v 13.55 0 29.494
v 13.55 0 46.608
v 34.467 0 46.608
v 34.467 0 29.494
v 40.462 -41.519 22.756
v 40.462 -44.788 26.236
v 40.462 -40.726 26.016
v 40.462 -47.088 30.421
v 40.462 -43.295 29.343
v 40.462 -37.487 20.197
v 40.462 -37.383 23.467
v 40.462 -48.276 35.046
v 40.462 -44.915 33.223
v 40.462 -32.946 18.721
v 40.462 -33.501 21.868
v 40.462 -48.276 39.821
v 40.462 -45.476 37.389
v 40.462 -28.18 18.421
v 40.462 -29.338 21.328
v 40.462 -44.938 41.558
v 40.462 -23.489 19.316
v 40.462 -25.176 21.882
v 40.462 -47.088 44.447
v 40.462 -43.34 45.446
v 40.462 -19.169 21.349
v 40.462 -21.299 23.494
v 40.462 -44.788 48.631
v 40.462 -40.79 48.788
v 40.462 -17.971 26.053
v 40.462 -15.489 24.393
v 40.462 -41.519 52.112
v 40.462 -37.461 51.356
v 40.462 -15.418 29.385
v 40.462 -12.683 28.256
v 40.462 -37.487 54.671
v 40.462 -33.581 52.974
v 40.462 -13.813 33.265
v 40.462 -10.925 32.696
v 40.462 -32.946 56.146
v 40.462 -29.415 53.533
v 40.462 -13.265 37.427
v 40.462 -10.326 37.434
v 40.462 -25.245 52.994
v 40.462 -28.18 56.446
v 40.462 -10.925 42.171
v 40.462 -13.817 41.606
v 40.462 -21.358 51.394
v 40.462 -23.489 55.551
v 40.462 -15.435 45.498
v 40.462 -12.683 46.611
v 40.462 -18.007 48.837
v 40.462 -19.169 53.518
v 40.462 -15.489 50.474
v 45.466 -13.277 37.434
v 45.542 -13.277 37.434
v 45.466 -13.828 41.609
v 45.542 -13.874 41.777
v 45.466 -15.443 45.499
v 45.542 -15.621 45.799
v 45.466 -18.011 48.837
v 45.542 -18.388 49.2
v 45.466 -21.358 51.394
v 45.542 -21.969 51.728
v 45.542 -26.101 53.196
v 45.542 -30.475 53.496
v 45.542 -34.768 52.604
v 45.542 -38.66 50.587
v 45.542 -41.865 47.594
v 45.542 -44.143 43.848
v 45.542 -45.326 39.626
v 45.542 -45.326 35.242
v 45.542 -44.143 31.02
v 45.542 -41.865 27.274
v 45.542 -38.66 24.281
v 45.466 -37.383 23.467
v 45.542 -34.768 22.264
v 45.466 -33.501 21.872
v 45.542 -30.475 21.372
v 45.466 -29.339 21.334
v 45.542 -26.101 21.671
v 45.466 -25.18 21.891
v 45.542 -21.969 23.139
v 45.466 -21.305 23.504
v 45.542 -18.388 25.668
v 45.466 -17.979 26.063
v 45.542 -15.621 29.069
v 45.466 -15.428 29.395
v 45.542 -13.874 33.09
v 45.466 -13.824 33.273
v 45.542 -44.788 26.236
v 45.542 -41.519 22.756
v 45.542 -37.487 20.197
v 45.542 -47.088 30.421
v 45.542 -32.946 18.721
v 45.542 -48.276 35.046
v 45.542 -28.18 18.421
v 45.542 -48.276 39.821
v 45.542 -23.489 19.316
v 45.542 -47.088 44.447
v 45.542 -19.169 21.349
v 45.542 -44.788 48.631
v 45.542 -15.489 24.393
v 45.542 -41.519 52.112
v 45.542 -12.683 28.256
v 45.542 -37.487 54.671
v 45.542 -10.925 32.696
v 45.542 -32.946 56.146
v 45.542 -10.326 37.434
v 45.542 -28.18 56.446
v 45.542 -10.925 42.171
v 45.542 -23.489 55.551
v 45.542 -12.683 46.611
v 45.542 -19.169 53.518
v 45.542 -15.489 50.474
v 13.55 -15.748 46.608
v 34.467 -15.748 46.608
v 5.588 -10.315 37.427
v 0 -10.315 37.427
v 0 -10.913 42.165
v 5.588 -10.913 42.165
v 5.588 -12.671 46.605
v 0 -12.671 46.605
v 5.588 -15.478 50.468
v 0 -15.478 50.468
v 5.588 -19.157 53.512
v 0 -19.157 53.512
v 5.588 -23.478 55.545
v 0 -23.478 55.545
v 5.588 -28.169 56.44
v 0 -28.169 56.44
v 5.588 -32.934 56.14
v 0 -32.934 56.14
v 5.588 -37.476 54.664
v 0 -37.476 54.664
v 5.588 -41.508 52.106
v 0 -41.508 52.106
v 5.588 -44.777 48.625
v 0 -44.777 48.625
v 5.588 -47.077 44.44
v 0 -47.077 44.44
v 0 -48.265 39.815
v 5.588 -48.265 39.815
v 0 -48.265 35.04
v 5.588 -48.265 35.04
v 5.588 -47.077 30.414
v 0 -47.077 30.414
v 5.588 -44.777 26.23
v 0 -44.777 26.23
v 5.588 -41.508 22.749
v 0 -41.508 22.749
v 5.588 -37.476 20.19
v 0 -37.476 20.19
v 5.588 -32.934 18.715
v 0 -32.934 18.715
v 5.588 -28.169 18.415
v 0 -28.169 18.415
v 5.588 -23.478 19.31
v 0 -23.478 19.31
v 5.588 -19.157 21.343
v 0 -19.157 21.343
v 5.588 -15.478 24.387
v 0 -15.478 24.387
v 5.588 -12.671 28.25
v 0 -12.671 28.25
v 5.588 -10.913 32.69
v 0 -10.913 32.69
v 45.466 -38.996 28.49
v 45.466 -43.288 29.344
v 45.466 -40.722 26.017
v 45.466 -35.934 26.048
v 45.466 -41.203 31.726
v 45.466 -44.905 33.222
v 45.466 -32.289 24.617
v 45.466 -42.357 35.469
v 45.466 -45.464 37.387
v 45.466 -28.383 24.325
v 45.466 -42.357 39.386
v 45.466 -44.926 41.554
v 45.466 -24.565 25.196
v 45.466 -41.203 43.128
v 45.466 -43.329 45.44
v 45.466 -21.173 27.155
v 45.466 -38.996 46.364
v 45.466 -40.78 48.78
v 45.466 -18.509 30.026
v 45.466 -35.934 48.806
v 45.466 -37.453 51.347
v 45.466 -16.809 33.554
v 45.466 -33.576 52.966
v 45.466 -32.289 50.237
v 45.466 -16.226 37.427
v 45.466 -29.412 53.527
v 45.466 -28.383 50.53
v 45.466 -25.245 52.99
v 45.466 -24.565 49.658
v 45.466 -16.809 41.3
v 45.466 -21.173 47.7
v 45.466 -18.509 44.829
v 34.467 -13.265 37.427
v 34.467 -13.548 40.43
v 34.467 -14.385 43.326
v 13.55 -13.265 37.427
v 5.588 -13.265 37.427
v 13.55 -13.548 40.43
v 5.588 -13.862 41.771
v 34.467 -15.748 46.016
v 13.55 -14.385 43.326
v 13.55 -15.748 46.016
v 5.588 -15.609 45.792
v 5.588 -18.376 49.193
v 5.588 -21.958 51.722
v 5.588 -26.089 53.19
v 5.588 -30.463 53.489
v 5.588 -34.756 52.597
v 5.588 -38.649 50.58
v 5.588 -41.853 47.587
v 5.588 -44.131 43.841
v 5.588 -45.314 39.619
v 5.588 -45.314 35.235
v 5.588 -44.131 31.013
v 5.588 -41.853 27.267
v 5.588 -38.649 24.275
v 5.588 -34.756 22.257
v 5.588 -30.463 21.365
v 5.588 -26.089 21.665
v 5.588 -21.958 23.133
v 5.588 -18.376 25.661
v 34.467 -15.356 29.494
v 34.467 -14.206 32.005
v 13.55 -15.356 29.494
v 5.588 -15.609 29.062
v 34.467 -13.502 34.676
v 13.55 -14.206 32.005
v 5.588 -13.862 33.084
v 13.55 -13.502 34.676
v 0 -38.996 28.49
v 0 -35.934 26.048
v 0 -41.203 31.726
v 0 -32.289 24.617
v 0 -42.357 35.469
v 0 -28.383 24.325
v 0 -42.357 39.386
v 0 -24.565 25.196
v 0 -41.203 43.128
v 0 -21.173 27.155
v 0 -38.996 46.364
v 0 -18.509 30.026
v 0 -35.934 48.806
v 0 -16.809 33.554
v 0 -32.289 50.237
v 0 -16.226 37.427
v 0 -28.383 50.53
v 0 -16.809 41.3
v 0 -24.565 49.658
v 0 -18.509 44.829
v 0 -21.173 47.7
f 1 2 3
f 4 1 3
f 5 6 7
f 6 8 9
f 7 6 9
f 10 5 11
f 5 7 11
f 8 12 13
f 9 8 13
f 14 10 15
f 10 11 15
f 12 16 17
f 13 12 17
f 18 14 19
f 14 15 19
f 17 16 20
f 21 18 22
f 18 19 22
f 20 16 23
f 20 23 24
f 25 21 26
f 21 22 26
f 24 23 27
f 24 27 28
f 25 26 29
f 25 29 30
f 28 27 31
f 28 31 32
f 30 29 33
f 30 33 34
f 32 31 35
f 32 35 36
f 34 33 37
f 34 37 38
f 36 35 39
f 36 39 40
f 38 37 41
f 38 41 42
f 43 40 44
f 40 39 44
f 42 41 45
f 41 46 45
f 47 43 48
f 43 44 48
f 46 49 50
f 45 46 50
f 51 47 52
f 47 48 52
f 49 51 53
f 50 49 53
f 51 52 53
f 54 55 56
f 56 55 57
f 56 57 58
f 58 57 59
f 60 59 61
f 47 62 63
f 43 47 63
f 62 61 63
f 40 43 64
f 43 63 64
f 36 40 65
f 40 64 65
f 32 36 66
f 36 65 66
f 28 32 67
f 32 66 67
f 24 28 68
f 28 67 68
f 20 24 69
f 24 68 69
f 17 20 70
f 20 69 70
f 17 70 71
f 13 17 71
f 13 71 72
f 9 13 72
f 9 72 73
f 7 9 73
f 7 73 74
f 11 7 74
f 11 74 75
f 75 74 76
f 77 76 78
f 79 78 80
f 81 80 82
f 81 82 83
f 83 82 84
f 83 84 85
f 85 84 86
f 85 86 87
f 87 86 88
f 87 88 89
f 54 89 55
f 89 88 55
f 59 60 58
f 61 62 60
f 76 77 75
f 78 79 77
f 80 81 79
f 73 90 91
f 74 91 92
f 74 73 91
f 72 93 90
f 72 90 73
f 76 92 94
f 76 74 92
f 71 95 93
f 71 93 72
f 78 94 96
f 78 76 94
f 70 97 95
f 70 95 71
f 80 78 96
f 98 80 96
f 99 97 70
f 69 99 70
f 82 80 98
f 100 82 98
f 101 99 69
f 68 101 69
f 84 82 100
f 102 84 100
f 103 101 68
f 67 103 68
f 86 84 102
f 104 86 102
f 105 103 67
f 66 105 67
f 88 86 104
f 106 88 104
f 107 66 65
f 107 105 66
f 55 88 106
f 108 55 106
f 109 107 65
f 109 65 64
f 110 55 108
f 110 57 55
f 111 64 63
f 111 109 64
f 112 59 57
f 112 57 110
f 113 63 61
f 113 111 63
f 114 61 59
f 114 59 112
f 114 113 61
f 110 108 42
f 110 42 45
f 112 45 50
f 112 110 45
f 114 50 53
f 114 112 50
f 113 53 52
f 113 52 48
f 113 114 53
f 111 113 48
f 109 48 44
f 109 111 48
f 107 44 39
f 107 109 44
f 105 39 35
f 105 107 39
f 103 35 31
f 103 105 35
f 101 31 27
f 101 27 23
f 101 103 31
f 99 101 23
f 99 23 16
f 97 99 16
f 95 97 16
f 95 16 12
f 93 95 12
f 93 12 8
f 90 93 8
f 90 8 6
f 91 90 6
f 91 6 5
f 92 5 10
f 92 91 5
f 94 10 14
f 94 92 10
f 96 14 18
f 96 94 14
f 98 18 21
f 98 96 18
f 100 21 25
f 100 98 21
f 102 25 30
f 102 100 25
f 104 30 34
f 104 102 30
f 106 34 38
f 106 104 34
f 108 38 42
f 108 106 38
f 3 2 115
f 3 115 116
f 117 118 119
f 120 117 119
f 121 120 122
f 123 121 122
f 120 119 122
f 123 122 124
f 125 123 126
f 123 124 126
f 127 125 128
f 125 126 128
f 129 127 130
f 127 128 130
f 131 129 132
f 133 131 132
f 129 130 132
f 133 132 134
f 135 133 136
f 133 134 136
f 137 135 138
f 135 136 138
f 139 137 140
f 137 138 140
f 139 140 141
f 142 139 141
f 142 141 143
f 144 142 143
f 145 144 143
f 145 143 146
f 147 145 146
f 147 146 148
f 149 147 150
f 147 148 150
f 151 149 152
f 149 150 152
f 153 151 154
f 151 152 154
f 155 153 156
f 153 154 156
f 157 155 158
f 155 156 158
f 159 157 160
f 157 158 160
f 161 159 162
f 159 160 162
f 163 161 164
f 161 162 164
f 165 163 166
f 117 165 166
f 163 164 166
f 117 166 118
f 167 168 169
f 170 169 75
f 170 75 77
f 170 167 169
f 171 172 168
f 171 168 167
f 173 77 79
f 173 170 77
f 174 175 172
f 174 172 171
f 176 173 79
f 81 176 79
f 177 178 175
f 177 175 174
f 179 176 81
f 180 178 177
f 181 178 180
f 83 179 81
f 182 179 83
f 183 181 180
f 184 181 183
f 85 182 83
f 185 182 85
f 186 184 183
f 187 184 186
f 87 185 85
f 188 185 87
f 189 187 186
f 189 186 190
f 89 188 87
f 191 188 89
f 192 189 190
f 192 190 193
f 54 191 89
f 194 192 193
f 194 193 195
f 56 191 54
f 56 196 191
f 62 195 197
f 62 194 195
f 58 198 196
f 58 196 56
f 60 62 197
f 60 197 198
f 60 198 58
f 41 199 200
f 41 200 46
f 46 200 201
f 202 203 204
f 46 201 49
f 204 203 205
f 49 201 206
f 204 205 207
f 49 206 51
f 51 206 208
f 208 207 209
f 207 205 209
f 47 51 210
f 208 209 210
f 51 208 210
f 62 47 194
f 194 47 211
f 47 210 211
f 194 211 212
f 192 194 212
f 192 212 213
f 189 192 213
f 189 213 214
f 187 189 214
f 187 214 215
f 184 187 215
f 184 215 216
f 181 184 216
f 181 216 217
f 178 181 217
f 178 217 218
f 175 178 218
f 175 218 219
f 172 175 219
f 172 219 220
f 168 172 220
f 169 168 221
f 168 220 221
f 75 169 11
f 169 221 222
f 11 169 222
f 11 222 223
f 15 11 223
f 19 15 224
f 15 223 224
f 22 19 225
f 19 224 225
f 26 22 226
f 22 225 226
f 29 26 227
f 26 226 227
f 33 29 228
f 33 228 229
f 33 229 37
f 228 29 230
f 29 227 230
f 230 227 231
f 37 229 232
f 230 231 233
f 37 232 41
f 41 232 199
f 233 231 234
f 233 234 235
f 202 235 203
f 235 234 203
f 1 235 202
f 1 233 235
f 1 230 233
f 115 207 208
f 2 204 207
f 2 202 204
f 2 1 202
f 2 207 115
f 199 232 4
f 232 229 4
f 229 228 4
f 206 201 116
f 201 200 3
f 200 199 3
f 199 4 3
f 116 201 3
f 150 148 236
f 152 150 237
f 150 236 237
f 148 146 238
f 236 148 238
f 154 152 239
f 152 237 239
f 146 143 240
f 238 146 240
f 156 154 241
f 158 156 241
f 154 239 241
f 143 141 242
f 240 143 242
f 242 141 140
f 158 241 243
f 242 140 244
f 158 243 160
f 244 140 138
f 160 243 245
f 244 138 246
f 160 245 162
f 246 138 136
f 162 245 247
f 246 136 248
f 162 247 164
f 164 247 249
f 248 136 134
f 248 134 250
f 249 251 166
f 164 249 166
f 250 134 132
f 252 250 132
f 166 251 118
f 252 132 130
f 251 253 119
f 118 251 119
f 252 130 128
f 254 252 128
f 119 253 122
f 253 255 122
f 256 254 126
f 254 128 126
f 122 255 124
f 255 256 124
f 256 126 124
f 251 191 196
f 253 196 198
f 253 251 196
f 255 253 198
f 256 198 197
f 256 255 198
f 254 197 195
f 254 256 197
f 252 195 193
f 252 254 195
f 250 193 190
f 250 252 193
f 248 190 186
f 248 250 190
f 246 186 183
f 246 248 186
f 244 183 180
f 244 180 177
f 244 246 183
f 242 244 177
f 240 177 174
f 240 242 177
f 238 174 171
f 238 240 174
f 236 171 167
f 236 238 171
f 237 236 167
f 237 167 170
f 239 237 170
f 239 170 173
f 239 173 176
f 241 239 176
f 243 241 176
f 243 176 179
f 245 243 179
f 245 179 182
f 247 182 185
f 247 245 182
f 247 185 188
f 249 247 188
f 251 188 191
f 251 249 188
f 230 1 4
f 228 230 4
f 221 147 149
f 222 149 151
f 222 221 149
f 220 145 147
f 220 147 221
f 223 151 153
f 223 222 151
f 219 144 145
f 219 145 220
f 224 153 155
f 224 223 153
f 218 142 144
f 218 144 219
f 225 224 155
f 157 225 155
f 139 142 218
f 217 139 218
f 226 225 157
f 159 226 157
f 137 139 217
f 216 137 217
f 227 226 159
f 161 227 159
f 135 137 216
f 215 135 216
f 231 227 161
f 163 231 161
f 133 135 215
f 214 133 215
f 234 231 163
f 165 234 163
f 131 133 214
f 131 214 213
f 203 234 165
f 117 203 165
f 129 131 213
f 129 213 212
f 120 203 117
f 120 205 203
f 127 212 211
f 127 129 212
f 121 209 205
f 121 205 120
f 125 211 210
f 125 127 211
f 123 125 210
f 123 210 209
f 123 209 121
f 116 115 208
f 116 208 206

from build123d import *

# Parameters (mm, degrees)
F0_R     = 19.05
F0_R_2   = 16.099385
F1_DEPTH = 5.588
F0_R_3   = 13.139172
F2_DEPTH = 45.466
F4_R     = 19.05
F4_R_2   = 16.099385
F5_DEPTH = 5.08
F6_W     = 20.917241
F6_H     = 17.11411
F7_DEPTH = 15.748


with BuildPart() as f1:
    # F0 (on Right) → F1 (new body)
    with BuildSketch(Plane.YZ):
        with Locations((-29.364781, 37.427243)):
            Circle(F0_R)
        with Locations((-29.364781, 37.427243)):
            Circle(F0_R_2, mode=Mode.SUBTRACT)
    extrude(amount=F1_DEPTH)

    # F0 (on Right) → F2 (join)
    with BuildSketch(Plane.YZ):
        with Locations((-29.364781, 37.427243)):
            Circle(F0_R_2)
        with Locations((-29.364781, 37.427243)):
            Circle(F0_R_3, mode=Mode.SUBTRACT)
    extrude(amount=F2_DEPTH)

    # F4 (on offset) → F5 (join)
    with BuildSketch(Plane.YZ.offset(45.5422)):
        with Locations((-29.376194, 37.433792)):
            Circle(F4_R)
        with Locations((-29.376194, 37.433792)):
            Circle(F4_R_2, mode=Mode.SUBTRACT)
    extrude(amount=-F5_DEPTH)

    # F6 (on Front) → F7 (join)
    with BuildSketch(Plane.XZ):
        with Locations((24.008229, 38.051244)):
            Rectangle(F6_W, F6_H)
    extrude(amount=F7_DEPTH)


solid = f1.part
